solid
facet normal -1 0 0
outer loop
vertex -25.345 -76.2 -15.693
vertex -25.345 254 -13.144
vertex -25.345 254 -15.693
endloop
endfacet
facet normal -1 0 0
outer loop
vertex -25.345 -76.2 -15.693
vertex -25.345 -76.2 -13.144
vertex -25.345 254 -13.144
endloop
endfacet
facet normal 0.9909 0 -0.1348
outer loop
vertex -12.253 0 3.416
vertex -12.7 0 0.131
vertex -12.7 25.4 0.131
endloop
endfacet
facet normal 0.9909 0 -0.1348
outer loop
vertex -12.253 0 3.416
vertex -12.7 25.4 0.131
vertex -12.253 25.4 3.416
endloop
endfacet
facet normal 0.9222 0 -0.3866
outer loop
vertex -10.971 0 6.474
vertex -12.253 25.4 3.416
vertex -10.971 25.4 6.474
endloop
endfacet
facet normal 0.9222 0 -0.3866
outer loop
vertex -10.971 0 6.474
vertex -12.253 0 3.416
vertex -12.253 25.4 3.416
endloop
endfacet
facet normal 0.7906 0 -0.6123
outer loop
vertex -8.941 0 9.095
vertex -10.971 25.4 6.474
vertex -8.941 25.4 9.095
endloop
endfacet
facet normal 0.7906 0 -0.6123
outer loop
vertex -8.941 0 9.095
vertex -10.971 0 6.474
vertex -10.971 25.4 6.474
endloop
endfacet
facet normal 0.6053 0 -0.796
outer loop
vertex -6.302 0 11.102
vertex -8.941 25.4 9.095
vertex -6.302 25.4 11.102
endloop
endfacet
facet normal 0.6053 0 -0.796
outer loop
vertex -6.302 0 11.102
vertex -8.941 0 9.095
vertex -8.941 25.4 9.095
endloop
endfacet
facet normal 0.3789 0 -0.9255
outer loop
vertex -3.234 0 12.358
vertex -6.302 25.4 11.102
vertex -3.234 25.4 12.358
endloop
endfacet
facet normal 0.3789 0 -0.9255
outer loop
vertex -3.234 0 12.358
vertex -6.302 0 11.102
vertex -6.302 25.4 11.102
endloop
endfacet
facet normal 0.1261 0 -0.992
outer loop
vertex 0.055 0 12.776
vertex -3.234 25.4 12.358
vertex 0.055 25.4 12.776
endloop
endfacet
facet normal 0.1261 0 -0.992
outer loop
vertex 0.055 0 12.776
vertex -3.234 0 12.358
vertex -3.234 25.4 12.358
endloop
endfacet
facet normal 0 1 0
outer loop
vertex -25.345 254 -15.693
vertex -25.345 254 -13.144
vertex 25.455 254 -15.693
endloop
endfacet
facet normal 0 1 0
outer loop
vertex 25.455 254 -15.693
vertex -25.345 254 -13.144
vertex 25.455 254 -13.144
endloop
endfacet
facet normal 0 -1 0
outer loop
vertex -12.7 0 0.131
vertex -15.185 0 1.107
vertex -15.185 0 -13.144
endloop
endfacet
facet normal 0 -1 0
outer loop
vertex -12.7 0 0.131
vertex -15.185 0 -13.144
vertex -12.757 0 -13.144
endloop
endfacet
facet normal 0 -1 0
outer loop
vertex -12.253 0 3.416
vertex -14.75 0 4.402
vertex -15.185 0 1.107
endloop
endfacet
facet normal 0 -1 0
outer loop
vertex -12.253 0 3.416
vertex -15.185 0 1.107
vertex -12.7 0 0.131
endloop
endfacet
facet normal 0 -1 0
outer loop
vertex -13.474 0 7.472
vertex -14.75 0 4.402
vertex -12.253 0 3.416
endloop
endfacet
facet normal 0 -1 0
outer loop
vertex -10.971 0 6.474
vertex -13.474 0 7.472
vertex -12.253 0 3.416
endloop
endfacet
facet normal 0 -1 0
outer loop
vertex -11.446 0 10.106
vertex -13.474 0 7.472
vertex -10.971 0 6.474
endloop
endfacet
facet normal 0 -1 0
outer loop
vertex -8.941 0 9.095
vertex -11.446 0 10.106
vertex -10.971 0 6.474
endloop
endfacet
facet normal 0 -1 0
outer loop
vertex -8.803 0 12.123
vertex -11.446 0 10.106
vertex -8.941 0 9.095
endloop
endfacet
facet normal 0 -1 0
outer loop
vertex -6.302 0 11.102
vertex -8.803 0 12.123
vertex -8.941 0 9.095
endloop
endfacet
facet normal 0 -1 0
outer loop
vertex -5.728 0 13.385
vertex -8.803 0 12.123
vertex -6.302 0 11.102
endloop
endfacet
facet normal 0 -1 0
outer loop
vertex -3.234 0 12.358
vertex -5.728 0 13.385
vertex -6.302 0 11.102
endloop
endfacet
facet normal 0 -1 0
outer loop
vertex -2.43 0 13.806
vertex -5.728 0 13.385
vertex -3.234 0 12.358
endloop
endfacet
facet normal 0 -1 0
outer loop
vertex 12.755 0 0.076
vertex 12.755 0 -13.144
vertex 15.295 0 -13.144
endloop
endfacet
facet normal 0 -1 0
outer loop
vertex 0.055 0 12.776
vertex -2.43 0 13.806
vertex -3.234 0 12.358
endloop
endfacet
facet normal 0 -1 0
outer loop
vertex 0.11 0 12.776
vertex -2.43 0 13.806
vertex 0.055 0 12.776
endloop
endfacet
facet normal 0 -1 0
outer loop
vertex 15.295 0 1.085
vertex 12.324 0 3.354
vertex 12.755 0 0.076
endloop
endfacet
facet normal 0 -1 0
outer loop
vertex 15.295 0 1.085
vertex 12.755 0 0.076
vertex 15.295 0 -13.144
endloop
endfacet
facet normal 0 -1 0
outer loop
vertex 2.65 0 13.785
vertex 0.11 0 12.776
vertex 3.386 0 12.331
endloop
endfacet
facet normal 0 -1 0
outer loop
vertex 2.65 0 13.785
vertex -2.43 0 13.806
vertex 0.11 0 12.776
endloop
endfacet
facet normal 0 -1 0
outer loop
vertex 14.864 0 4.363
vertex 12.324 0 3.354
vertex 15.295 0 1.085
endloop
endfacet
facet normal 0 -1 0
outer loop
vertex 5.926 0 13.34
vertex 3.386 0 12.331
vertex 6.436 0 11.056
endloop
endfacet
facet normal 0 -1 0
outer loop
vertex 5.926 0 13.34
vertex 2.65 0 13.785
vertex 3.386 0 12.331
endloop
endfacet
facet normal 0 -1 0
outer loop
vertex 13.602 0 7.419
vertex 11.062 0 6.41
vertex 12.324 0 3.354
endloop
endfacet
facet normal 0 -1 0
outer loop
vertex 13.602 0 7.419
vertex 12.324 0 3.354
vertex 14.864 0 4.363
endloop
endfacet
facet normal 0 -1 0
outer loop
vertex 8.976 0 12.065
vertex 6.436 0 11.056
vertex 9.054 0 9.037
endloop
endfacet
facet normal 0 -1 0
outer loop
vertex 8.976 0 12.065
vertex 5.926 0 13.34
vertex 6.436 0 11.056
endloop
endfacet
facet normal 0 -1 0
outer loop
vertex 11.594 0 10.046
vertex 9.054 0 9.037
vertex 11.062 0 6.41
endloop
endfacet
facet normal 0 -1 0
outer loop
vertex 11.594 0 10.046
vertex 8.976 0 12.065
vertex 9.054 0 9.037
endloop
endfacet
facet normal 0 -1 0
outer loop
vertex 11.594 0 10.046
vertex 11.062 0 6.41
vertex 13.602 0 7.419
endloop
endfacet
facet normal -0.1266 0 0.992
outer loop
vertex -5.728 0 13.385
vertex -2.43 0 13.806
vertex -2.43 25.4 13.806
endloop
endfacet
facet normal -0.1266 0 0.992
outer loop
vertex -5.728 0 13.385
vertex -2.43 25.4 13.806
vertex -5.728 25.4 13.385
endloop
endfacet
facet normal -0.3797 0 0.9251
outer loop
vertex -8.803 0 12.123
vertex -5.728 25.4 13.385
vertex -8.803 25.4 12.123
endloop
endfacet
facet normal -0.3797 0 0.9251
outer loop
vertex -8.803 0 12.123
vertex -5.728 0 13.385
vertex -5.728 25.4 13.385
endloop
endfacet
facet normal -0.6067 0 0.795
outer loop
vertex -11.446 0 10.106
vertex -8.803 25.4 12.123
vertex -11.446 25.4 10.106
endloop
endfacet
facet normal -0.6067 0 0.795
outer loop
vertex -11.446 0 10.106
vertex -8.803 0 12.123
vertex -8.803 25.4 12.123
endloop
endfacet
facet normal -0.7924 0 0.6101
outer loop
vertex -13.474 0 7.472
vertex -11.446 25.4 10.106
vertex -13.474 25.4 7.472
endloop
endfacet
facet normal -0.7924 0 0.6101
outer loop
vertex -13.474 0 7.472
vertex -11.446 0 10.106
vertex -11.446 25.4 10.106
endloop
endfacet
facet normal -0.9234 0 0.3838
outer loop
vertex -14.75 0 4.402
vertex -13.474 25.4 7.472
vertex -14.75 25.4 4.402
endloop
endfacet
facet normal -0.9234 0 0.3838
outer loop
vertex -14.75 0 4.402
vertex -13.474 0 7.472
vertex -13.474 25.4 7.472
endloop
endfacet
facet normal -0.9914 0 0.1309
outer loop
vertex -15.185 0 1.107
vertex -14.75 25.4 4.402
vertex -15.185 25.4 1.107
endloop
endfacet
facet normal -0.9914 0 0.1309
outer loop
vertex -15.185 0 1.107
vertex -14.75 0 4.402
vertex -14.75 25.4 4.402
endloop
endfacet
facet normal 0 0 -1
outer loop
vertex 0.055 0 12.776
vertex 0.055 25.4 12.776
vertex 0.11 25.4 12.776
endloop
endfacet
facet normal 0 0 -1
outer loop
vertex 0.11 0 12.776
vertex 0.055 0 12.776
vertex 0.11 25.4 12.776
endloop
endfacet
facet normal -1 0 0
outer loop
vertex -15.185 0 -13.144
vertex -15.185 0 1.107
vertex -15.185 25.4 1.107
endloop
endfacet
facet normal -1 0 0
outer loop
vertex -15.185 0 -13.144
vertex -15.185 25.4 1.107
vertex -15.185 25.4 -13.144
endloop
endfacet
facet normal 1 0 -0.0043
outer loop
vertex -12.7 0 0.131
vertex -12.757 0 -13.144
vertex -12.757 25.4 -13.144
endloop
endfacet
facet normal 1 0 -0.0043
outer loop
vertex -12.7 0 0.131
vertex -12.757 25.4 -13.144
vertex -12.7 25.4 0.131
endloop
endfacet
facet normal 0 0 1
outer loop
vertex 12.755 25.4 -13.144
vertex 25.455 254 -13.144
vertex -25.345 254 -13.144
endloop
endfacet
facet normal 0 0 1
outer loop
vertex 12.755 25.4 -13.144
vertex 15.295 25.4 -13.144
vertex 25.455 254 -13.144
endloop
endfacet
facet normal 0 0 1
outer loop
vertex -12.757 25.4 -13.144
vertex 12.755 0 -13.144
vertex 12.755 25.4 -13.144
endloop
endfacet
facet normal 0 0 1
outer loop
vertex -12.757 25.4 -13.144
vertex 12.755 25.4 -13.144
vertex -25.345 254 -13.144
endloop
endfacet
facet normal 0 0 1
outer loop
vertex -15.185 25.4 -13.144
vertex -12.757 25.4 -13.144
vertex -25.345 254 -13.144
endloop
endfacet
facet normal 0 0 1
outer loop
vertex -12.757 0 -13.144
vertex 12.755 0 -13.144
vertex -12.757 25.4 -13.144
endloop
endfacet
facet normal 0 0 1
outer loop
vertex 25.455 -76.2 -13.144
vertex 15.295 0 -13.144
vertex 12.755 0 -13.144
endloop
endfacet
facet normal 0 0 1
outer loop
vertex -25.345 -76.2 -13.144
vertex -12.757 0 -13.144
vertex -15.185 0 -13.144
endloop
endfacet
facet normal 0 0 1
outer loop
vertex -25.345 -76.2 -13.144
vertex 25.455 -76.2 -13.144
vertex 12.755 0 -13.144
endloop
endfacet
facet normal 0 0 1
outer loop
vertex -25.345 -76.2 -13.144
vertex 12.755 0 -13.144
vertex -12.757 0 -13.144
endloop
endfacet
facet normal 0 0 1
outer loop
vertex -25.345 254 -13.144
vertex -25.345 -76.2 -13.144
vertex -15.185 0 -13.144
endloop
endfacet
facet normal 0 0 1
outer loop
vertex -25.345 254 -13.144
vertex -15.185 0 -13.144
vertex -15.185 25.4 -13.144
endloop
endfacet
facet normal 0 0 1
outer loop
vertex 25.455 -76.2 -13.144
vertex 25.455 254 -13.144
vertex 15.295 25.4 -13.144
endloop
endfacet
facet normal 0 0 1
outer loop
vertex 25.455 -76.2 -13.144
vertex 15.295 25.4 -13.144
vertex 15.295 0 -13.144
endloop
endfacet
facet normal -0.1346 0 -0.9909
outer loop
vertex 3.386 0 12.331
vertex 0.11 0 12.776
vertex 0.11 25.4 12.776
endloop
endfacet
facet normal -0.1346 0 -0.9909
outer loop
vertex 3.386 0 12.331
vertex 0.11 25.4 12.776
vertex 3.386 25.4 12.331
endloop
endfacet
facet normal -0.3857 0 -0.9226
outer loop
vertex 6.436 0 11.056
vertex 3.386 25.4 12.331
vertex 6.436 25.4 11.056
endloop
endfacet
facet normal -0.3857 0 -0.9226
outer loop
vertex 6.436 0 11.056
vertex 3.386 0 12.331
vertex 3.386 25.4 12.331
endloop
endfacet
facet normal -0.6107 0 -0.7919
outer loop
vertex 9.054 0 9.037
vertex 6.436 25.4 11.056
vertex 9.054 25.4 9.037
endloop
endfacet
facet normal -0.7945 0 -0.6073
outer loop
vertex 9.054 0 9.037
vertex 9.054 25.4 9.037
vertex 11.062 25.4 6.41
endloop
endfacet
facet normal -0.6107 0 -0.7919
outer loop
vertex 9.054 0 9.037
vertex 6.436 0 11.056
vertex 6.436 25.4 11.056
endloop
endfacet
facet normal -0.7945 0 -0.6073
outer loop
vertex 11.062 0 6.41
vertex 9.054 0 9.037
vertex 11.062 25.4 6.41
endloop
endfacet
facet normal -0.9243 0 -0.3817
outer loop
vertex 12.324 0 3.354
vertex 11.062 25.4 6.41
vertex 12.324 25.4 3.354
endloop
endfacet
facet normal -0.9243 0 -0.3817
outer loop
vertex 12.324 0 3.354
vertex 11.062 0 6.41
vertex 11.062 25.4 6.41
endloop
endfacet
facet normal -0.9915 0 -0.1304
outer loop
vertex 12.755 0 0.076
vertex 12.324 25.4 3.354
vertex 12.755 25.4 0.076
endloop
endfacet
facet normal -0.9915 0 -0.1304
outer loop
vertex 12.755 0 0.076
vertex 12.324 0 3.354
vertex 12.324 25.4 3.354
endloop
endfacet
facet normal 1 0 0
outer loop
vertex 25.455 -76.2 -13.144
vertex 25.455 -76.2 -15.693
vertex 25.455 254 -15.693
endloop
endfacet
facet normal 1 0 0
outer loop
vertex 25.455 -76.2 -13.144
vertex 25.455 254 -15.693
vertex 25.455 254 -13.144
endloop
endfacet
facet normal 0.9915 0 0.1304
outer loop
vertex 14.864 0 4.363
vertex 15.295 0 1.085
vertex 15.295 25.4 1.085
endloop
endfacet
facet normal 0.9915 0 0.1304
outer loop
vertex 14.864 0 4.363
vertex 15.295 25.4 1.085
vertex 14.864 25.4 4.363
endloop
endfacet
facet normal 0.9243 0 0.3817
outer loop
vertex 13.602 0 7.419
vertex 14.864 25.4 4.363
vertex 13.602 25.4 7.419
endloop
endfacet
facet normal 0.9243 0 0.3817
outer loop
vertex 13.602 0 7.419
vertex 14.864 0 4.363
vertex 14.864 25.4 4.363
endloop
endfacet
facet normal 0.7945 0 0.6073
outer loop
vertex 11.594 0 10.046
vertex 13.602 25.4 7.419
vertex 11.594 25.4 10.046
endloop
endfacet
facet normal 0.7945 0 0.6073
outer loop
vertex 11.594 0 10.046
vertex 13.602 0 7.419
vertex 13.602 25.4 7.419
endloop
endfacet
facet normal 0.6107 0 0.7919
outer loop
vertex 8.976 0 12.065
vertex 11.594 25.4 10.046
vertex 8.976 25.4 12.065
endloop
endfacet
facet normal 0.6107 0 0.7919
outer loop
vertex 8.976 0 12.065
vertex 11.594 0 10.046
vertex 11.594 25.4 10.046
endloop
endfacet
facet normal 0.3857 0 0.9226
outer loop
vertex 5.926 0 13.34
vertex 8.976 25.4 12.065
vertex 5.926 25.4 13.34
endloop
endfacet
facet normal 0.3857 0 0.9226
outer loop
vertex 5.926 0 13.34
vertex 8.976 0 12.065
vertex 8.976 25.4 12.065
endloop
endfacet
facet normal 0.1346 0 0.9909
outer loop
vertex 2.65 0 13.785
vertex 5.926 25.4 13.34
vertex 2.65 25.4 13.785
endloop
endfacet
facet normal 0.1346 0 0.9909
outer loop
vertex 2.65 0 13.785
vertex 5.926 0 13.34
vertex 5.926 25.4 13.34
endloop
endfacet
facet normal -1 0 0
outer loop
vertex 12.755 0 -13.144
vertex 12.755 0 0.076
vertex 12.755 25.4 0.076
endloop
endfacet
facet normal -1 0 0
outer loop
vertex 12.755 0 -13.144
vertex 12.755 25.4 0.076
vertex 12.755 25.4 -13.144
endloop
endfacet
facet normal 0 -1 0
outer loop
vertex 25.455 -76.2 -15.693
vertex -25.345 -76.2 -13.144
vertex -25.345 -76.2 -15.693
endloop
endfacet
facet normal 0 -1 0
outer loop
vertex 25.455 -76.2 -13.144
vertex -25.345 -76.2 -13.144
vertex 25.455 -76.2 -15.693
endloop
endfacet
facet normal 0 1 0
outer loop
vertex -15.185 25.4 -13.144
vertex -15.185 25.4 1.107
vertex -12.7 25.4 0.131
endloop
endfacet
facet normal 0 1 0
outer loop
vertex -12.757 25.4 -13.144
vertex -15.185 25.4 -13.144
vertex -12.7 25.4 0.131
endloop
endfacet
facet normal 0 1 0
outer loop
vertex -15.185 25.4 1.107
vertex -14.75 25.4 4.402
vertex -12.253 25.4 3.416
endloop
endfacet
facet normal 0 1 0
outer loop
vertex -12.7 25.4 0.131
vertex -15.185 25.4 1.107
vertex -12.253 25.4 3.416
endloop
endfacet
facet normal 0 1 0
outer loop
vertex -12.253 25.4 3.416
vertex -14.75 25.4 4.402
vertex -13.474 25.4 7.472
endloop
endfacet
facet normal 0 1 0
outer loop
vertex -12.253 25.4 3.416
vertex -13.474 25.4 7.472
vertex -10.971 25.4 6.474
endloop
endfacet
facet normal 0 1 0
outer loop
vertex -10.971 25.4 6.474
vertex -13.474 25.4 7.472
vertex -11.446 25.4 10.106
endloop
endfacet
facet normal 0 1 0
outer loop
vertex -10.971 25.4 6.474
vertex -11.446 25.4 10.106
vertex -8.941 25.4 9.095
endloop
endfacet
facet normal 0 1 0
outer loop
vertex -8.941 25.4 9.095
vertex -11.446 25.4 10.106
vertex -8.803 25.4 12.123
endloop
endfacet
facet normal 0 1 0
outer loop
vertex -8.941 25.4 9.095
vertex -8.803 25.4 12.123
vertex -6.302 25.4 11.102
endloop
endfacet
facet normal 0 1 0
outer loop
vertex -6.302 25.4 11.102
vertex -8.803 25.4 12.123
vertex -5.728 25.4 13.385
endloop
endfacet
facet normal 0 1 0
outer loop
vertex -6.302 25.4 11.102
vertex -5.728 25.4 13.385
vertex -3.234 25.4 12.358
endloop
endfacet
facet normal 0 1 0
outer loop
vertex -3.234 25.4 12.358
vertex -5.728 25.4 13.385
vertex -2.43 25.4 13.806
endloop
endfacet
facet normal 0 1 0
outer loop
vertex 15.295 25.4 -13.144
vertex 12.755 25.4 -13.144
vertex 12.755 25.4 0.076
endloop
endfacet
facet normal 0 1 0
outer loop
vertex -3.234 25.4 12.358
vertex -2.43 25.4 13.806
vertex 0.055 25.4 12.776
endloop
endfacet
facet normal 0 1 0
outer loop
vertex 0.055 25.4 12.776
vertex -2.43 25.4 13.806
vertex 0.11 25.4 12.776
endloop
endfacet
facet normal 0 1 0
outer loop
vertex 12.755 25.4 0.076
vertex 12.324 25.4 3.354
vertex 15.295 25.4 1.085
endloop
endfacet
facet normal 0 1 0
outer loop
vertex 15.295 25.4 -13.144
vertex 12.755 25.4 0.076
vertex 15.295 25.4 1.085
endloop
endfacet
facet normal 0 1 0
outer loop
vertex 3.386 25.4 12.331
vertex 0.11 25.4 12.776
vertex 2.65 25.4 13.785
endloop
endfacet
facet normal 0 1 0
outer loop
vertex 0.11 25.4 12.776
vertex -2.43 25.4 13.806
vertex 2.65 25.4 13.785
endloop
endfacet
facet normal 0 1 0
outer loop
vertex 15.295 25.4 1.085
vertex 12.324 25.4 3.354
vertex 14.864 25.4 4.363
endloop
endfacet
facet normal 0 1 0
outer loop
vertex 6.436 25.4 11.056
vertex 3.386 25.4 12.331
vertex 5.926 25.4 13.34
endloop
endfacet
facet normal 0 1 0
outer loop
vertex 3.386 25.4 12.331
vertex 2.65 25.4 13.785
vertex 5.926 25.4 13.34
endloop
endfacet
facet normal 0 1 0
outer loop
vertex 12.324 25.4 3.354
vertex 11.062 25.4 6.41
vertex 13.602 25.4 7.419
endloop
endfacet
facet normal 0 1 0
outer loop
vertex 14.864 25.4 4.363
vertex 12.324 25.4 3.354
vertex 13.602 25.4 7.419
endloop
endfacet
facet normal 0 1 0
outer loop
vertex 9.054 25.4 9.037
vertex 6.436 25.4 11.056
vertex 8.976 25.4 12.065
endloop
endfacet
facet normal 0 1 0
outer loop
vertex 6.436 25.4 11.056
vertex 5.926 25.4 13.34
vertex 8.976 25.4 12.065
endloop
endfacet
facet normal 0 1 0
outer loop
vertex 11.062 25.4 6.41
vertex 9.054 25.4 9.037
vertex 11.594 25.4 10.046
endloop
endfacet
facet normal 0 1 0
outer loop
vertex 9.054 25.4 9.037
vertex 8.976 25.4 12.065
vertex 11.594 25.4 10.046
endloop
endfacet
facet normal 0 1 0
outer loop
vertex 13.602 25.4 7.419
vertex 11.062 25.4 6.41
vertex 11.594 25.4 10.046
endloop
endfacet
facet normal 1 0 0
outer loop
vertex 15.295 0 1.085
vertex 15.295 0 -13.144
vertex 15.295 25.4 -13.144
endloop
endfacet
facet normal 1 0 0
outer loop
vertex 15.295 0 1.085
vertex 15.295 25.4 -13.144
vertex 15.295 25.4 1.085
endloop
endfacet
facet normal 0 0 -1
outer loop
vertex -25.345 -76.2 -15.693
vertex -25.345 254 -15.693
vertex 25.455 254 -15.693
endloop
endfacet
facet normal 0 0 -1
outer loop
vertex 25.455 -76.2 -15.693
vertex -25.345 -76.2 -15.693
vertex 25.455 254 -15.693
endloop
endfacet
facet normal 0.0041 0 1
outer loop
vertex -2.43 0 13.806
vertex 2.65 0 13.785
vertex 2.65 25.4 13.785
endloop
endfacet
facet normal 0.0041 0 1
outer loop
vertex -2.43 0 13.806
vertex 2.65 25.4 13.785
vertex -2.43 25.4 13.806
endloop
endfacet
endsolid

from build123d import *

# Parameters (mm, degrees)
F1_DEPTH = 76.2
F2_DEPTH = 254
F3_DEPTH = 25.4


with BuildPart() as f1:
    # F0 (on Front) → F1 (new body)
    with BuildSketch(Plane.XZ):
        Polygon((-15.184847, -13.14384), (-25.345129, -13.14384), (-25.345129, -15.692936), (25.454871, -15.692936), (25.454871, -13.14384), (15.294871, -13.14384), (12.754871, -13.14384), (-12.756689, -13.14384), align=None)
    extrude(amount=F1_DEPTH)

    # F0 (on Front) → F2 (join)
    with BuildSketch(Plane.XZ):
        Polygon((-15.184847, -13.14384), (-25.345129, -13.14384), (-25.345129, -15.692936), (25.454871, -15.692936), (25.454871, -13.14384), (15.294871, -13.14384), (12.754871, -13.14384), (-12.756689, -13.14384), align=None)
    extrude(amount=-F2_DEPTH)

    # F0 (on Front) → F3 (join)
    with BuildSketch(Plane.XZ):
        with BuildLine():
            Line((-15.184847, 1.1065), (-15.184847, -13.14384))
            Line((-15.184847, -13.14384), (-12.756689, -13.14384))
            Line((-12.756689, -13.14384), (-12.699554, 0.13098))
            ThreePointArc((-12.699554, 0.13098), (-8.941194, 9.095144), (0.054989, 12.776202))
            Line((0.054989, 12.776202), (0.109531, 12.775968))
            ThreePointArc((0.109531, 12.775968), (9.054432, 9.036995), (12.754871, 0.076085))
            Line((12.754871, 0.076085), (12.754871, -13.14384))
            Line((12.754871, -13.14384), (15.294871, -13.14384))
            Line((15.294871, -13.14384), (15.294871, 1.084637))
            ThreePointArc((15.294871, 1.084637), (11.594432, 10.045547), (2.649531, 13.784519))
            Line((2.649531, 13.784519), (-2.430187, 13.806382))
            ThreePointArc((-2.430187, 13.806382), (-11.445757, 10.10606), (-15.184847, 1.1065))
        make_face()
    extrude(amount=-F3_DEPTH)


solid = f1.part
